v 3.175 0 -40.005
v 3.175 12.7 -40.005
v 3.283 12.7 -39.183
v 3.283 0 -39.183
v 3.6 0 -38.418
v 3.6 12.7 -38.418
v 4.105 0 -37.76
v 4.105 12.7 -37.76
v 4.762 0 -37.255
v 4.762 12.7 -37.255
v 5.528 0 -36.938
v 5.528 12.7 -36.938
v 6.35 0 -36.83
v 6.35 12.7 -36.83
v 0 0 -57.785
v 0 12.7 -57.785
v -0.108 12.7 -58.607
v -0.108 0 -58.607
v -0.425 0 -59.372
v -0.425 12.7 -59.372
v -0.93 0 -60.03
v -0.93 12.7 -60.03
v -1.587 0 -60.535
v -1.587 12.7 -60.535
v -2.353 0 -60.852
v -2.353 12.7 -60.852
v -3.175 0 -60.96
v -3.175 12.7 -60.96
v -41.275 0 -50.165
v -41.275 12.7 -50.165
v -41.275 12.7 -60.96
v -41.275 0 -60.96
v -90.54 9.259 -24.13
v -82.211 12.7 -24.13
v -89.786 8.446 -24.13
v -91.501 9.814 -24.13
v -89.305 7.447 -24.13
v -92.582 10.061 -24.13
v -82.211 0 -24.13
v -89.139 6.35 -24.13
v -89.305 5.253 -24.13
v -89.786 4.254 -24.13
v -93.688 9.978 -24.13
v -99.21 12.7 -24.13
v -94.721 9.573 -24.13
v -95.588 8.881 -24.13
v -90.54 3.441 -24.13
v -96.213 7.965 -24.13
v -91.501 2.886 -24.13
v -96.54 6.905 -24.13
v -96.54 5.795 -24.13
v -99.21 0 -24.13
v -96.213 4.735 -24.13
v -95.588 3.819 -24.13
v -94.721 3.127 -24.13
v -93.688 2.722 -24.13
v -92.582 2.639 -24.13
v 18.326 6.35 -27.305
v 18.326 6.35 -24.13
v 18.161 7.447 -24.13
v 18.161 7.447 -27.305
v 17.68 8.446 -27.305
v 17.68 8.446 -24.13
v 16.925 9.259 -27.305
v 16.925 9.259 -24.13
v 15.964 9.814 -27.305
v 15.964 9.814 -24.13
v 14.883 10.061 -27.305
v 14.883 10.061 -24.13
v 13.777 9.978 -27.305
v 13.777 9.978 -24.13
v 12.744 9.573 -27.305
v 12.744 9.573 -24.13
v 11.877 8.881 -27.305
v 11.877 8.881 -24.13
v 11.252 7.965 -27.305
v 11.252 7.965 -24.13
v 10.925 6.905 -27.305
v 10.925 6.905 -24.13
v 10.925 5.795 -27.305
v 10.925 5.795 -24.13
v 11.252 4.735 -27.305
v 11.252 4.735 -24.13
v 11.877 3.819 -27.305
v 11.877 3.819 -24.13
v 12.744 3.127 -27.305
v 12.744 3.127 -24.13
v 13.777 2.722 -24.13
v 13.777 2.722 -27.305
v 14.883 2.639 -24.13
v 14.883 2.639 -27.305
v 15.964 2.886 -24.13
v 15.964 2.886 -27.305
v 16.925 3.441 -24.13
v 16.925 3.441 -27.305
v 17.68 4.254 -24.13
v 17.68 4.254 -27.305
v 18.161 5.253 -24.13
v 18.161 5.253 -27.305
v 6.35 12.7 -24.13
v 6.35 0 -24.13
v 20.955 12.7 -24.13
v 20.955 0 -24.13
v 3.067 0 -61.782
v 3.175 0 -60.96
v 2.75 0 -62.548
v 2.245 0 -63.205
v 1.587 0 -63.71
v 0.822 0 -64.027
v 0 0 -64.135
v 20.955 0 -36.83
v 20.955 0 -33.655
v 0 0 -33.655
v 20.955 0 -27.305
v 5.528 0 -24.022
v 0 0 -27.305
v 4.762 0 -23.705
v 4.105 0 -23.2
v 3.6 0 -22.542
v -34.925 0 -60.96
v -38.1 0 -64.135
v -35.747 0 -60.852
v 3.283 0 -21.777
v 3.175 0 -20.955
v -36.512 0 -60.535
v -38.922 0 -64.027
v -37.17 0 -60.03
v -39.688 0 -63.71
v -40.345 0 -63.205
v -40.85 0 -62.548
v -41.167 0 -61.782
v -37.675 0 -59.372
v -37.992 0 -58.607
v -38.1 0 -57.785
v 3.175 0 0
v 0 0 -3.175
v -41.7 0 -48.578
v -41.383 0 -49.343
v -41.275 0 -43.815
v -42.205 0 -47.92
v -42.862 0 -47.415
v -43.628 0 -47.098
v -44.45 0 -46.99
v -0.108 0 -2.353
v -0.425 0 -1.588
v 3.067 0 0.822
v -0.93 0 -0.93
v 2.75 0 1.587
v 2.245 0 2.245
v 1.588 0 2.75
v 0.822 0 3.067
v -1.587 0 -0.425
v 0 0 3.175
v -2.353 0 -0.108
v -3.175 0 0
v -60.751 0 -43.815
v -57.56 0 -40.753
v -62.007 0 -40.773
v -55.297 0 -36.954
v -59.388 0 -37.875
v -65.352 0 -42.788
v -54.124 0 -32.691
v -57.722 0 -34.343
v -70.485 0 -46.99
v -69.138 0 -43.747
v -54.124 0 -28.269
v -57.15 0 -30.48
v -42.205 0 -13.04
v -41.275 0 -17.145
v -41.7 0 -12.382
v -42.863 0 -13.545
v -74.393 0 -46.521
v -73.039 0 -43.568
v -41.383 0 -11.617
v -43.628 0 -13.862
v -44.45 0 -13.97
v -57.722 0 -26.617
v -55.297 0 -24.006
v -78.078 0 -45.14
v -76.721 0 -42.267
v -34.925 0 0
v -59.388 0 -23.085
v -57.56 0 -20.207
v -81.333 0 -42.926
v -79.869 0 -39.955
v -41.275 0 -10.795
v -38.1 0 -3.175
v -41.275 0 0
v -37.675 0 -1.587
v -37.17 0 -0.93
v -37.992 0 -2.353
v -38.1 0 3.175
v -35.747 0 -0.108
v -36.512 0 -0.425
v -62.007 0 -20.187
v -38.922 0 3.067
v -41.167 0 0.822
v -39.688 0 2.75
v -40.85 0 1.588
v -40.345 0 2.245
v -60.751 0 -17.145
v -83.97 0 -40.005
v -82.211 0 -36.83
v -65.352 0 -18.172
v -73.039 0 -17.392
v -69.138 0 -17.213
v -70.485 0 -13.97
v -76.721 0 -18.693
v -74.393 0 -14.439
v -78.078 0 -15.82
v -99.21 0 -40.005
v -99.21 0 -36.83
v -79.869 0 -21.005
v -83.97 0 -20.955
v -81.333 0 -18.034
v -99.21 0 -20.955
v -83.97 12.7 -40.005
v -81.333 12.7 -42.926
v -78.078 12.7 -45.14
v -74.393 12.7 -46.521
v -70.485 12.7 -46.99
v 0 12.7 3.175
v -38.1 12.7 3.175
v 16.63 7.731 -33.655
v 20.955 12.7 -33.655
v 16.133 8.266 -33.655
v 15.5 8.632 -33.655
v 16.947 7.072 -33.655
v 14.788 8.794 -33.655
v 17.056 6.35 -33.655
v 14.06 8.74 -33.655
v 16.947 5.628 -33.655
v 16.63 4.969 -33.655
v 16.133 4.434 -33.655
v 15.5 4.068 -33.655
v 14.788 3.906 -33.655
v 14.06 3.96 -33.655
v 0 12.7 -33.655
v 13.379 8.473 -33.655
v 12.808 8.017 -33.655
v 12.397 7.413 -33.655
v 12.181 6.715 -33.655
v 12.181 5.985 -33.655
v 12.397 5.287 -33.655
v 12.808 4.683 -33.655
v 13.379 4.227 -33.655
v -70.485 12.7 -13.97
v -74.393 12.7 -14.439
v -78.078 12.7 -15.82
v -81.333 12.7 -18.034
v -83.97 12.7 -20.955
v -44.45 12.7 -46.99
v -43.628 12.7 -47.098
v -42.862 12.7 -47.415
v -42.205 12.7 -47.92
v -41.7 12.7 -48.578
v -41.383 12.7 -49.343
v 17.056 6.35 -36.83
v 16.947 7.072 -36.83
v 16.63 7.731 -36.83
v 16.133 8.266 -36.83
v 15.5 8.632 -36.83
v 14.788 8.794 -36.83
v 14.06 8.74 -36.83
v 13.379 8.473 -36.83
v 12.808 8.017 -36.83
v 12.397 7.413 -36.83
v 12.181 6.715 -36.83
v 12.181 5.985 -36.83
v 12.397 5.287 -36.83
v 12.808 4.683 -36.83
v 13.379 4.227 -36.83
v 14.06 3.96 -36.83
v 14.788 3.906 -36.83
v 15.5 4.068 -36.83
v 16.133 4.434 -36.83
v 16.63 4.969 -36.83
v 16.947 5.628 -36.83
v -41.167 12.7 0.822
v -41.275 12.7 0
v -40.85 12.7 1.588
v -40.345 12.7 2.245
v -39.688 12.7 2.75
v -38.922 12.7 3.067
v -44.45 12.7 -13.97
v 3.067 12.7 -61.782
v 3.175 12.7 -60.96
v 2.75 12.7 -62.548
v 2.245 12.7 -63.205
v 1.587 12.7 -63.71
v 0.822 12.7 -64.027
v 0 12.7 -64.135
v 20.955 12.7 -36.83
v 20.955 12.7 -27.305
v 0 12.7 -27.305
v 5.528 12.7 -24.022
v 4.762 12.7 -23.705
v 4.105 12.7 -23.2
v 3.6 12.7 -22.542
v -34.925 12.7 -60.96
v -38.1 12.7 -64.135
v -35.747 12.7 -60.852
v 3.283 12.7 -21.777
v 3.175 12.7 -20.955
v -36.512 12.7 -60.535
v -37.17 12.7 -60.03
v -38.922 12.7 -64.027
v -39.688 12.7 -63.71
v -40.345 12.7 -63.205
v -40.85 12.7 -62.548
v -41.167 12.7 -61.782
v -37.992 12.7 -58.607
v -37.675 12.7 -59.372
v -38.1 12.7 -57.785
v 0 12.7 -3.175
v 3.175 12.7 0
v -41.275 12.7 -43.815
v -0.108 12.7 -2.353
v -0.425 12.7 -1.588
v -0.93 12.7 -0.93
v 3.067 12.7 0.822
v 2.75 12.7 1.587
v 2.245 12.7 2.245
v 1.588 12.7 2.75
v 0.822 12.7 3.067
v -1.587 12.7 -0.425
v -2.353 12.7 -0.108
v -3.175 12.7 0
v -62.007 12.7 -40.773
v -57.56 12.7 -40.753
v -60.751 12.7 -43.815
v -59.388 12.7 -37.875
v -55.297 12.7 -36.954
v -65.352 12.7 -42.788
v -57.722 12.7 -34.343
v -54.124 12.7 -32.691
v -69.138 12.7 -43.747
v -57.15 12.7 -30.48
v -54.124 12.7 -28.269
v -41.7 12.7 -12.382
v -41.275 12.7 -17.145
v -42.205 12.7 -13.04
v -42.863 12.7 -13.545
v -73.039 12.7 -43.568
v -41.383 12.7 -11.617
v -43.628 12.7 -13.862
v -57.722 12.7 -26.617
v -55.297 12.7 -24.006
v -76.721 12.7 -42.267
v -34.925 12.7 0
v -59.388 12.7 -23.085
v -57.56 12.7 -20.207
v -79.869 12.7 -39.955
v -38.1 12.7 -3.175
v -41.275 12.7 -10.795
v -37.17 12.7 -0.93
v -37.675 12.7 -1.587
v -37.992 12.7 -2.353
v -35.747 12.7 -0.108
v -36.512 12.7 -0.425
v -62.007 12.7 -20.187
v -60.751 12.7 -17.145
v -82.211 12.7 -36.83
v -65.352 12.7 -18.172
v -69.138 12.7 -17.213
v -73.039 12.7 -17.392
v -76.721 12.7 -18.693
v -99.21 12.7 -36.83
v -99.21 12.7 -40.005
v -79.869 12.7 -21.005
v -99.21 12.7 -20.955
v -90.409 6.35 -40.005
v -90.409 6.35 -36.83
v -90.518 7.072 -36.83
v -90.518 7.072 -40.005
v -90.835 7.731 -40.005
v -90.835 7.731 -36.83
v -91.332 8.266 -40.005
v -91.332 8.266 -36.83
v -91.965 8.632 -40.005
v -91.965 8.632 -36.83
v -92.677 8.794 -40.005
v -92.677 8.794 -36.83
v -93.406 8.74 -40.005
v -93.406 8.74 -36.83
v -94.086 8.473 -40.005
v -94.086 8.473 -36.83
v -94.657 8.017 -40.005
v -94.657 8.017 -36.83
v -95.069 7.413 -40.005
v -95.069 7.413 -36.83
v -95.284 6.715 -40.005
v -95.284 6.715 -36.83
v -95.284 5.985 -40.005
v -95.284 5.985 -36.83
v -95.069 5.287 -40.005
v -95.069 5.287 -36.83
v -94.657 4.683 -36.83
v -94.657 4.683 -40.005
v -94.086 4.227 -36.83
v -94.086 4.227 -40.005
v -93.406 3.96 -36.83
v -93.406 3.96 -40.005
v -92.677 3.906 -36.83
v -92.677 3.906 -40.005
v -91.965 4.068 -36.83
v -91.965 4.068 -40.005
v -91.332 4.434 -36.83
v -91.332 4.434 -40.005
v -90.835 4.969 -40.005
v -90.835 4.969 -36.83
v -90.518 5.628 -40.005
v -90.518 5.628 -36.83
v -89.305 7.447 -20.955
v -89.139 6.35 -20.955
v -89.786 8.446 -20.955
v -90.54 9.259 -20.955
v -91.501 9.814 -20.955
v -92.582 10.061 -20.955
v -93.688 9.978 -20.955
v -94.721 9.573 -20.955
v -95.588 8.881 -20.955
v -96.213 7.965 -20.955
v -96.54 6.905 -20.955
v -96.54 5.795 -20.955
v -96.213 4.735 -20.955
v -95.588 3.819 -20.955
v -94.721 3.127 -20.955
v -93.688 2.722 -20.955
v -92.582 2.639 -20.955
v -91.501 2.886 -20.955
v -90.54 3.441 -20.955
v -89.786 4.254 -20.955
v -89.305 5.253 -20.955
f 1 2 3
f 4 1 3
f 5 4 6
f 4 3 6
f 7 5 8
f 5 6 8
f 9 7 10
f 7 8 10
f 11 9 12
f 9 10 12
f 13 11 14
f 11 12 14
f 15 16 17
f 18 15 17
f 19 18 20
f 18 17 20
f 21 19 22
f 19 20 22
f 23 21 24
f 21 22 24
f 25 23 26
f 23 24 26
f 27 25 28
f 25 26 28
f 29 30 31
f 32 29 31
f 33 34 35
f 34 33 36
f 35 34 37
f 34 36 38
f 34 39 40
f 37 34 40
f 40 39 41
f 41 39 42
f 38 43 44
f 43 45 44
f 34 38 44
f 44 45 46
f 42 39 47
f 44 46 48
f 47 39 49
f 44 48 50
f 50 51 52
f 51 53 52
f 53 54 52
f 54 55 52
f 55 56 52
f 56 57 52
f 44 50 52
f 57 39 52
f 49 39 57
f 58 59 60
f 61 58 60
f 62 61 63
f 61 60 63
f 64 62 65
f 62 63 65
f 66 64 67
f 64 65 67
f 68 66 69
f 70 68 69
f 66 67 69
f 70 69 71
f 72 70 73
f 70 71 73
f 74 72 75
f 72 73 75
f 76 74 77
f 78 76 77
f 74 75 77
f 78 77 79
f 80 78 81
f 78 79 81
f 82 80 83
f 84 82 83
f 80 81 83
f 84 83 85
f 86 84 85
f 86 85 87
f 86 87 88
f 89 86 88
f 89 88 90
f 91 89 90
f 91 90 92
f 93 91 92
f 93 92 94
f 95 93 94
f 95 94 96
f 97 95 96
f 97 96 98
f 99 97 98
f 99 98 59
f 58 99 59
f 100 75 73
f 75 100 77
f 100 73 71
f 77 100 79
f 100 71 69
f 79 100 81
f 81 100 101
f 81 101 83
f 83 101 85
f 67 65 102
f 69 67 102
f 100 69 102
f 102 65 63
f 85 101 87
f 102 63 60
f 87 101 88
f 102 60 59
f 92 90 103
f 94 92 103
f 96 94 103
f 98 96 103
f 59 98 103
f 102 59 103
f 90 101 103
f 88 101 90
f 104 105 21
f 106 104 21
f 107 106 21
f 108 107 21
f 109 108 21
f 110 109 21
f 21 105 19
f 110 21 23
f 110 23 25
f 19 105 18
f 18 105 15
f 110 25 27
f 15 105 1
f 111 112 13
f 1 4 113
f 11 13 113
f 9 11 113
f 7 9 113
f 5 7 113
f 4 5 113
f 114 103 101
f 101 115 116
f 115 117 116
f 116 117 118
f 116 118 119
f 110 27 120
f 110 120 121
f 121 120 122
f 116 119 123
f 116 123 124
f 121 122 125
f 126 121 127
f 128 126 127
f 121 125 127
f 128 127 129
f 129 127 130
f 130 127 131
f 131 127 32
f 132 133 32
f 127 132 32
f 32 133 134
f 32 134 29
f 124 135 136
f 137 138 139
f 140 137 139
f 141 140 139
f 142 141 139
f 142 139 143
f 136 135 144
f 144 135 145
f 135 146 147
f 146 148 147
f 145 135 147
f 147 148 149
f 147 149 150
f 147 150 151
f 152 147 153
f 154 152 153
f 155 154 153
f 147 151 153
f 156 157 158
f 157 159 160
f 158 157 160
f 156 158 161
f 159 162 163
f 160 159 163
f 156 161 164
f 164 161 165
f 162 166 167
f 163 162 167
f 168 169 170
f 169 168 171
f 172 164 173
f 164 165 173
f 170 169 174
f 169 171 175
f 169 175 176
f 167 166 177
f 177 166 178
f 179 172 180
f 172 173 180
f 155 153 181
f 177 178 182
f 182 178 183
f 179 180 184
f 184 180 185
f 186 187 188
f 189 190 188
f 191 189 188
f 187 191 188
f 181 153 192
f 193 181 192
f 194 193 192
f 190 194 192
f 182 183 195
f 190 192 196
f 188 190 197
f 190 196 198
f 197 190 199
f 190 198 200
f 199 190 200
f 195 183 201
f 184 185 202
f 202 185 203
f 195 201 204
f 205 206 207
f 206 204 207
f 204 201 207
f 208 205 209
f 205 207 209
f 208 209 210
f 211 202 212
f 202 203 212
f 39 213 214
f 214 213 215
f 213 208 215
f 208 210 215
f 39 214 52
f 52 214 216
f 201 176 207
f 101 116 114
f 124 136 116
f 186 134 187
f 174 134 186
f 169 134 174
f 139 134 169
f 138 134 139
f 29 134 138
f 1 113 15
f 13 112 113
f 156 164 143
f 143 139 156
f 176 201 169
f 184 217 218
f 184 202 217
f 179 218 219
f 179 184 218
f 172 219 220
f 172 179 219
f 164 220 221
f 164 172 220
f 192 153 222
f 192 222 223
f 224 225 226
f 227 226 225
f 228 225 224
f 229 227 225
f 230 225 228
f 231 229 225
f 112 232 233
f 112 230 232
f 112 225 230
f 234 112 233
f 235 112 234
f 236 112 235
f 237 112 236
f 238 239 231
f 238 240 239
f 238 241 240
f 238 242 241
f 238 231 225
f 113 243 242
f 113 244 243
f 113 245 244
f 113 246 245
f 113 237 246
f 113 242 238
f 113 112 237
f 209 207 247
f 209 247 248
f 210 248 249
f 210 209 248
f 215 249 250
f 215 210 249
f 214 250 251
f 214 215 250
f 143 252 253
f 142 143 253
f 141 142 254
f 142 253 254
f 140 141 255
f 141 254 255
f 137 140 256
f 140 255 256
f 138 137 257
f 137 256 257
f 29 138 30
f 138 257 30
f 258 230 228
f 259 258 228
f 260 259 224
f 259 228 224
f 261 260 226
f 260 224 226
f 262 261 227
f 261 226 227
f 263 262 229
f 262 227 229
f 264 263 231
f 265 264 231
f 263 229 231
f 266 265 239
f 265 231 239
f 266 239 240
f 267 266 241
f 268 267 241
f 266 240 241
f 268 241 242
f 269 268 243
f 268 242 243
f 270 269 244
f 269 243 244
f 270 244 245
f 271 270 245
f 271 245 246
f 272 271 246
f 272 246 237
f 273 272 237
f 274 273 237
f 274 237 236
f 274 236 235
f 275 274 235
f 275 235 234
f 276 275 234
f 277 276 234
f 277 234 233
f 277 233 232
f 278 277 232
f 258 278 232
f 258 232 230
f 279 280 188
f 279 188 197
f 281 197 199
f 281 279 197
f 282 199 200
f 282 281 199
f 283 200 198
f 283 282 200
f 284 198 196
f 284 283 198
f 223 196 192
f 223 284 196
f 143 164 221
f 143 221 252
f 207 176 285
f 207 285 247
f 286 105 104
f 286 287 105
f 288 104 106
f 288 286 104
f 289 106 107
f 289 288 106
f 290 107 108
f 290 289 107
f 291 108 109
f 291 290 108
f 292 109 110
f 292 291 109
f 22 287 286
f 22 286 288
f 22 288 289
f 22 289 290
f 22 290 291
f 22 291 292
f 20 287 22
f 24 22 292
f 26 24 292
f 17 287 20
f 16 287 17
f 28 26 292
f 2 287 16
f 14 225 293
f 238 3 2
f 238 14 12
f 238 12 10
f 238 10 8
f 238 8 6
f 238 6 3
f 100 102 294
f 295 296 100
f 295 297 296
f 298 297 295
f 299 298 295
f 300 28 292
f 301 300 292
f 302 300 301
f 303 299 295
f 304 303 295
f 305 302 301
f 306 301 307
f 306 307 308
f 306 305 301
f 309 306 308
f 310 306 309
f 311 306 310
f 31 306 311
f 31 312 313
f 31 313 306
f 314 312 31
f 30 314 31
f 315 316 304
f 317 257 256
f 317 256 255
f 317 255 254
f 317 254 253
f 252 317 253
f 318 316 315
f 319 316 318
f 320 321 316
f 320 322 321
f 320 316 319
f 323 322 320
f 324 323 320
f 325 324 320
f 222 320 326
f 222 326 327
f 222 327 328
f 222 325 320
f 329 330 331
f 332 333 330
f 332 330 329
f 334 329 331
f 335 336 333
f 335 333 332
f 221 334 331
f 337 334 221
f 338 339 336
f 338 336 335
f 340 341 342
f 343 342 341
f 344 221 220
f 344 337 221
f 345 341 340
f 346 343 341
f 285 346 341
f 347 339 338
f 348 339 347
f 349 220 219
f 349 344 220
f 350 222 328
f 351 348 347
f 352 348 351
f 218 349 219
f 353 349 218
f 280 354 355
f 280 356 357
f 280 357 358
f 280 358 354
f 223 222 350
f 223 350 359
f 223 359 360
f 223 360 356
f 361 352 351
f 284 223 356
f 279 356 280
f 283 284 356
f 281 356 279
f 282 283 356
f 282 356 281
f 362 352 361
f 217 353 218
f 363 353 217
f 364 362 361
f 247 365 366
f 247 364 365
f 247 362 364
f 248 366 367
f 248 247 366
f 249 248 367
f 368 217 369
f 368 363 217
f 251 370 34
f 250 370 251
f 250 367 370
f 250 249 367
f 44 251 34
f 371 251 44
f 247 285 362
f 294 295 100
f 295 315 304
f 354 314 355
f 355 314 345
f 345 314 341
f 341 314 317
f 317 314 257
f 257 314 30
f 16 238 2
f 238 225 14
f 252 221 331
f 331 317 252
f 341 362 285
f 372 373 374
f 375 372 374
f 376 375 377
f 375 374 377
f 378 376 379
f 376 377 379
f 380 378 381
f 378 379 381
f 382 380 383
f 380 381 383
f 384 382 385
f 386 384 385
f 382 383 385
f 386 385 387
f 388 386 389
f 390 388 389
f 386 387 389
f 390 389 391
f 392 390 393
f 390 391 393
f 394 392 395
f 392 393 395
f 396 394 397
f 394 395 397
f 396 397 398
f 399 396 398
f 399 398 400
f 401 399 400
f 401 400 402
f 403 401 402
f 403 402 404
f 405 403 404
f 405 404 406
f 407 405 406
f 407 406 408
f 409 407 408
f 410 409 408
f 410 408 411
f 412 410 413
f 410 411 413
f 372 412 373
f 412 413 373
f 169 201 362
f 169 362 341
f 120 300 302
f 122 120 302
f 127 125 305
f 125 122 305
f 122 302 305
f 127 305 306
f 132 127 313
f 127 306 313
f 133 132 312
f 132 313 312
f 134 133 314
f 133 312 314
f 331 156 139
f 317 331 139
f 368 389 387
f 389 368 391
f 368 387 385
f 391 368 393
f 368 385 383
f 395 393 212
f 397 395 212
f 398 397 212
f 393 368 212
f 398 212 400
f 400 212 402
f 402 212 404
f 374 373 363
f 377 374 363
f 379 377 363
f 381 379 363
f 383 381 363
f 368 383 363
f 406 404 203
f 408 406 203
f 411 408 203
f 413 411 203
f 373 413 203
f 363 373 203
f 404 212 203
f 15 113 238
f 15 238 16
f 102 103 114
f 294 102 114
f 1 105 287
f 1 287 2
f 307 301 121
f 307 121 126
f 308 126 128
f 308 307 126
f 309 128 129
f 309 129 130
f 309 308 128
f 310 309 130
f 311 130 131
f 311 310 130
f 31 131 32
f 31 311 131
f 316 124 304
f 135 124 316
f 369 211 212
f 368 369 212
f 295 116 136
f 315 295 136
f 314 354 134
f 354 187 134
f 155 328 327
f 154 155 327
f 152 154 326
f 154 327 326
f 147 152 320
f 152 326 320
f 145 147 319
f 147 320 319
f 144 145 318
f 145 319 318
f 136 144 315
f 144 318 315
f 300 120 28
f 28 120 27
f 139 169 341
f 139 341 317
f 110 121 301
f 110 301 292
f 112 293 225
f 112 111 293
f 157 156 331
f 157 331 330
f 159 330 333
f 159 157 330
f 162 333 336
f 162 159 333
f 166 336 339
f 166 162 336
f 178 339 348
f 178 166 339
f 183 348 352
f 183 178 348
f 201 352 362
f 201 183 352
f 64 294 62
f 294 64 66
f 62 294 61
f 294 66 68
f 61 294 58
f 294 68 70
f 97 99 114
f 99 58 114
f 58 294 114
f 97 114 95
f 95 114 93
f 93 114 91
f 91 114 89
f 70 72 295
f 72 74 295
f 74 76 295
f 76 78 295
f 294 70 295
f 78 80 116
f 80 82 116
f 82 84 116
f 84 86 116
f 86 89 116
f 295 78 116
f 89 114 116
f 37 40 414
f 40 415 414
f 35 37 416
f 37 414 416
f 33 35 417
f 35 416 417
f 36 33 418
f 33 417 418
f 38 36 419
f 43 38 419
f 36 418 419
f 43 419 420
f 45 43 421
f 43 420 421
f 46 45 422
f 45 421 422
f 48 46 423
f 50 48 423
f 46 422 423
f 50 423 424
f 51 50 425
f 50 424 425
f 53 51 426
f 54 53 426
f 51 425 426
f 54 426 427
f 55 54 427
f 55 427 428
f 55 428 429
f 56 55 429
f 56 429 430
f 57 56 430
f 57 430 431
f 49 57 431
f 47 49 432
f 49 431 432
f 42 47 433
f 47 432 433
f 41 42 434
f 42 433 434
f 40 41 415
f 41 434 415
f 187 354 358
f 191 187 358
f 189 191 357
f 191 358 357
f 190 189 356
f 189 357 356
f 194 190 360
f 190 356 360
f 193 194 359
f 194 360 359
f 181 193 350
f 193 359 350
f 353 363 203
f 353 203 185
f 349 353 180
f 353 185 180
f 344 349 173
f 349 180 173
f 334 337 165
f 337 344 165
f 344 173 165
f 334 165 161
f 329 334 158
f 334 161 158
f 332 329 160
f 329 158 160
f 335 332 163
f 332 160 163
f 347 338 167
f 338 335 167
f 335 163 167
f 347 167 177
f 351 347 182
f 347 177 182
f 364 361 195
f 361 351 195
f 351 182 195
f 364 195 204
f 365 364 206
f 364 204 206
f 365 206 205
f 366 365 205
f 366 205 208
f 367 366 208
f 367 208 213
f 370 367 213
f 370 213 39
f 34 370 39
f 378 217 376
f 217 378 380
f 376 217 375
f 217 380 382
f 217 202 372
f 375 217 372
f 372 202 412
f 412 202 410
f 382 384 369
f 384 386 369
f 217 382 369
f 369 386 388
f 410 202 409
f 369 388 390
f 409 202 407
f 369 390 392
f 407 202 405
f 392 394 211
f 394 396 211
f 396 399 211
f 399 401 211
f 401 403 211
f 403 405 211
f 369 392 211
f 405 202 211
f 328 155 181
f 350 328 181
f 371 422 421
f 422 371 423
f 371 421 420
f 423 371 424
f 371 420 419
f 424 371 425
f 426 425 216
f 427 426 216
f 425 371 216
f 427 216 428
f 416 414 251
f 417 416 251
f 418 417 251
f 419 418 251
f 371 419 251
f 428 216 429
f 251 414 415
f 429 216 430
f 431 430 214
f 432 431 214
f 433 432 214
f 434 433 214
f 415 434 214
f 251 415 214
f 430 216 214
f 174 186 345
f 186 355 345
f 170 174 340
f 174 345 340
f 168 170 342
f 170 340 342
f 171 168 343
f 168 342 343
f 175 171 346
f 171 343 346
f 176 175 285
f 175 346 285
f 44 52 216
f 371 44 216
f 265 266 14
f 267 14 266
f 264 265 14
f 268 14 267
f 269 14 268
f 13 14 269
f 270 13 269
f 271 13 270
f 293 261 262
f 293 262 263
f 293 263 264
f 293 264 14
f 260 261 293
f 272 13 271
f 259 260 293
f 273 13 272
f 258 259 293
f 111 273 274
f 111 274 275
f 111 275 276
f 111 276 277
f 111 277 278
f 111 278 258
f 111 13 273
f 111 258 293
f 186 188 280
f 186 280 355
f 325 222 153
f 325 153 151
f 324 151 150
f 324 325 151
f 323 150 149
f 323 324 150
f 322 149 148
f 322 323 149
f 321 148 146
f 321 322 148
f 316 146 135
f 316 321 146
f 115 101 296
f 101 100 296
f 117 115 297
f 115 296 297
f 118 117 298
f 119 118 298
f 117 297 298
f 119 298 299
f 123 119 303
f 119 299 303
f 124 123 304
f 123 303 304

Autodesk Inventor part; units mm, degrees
ref_plane "YZ Plane" through (0, 0, 0) normal (1, 0, 0) x (0, 1, 0)
ref_plane "XZ Plane" through (0, 0, 0) normal (0, 1, 0) x (-1, 0, 0)
ref_plane "XY Plane" through (0, 0, 0) normal (0, 0, 1) x (1, 0, 0)
sketch "Sketch1" plane through (0, 0, 0) normal (0, 1, 0) x (-1, 0, 0)
  line L0 (0, 0) -> (38.1, 0)
  line L1 (38.1, 0) -> (38.1, -60.96)
  line L2 (38.1, -60.96) -> (0, -60.96)
  line L3 (-3.175, 3.175) -> (41.275, 3.175)
  line L4 (41.275, 3.175) -> (41.275, -64.135)
  line L5 (41.275, -64.135) -> (-3.175, -64.135)
  line L6 (-3.175, -36.83) -> (-20.955, -36.83)
  line L7 (-20.955, -36.83) -> (-20.955, -33.655)
  line L8 (-20.955, -33.655) -> (0, -33.655)
  line L9 (0, -33.655) -> (0, -44.417)
  line L10 (-3.175, -24.13) -> (-20.955, -24.13)
  line L11 (-20.955, -24.13) -> (-20.955, -27.305)
  line L12 (-20.955, -27.305) -> (0, -27.305)
  line L13 (0, -27.305) -> (0, -17.217)
  line L14 (0, -60.96) -> (0, -33.655)
  line L15 (0, -27.305) -> (0, 0)
  line L16 (-3.175, -24.13) -> (-3.175, 3.175)
  line L17 (-3.175, -64.135) -> (-3.175, -36.83)
  arc A0 (82.211, -24.13) -> (82.211, -36.83) centre (70.485, -30.48) ccw
  line L18 (99.2103, -36.83) -> (82.211, -36.83)
  line L19 (99.2103, -40.005) -> (99.2103, -36.83)
  line L20 (82.211, -24.13) -> (99.2103, -24.13)
  line L21 (99.2103, -24.13) -> (99.2103, -20.955)
  line L22 (99.2103, -20.955) -> (83.9703, -20.955)
  line L23 (83.9703, -40.005) -> (99.2103, -40.005)
  arc A1 (83.9703, -20.955) -> (83.9703, -40.005) centre (70.485, -30.48) ccw
  line L24 (41.275, -13.97) -> (70.485, -13.97)
  line L25 (70.485, -46.99) -> (41.275, -46.99)
  line L26 (60.7506, -17.145) -> (41.275, -17.145)
  line L27 (60.7506, -43.815) -> (41.275, -43.815)
  point P0 (41.275, -30.48)
  dimension "d0" = 38.1
  dimension "d1" = 60.96
  dimension "d2" = 3.175
  dimension "d3" = 3.175
  dimension "d4" = 3.175
  dimension "d5" = 3.175
  dimension "d6" = 3.175
  dimension "d7" = 3.175
  dimension "d8" = 3.175
  dimension "d9" = 17.78
  dimension "d10" = 6.35
  dimension "d23" = 26.67
  dimension "d25" = 3.175
  dimension "d27" = 15.24
  dimension "d28" = 6.35
  dimension "d29" = 6.35
  dimension "d30" = 3.175
  dimension "d31" = 3.175
  dimension "d32" = 12.7
  dimension "d33" = 3.175
  dimension "d34" = 3.175
extrude "Extrusion1" add sketch "Sketch1" along normal blind 12.7 contours L15 L13 L12 L11 L10 L16 L3 L4 L5 L17 L6 L7 L8 L9 L14 L2 L1 L0 | L24 A1 L26 L4 | A1 L22 L21 L20 A0 L18 L19 L23 | L27 A1 L25 L4
sketch "Sketch2" plane through (3.175, 0, -24.13) normal (0, 0, 1) x (1, 0, 0)
  circle A0 centre (11.43, 6.35) radius 2.4511
  line L0 (0, 12.7) -> (17.78, 12.7) projected
  line L1 (17.78, 0) -> (17.78, 12.7) projected
  point P0 (-3.175, 0)
  dimension "d13" = 4.9022
  dimension "d14" = 6.35
  dimension "d15" = 6.35
extrude "Extrusion2" cut sketch "Sketch2" against normal blind 23.8125
sketch "Sketch3" plane through (3.175, 0, -24.13) normal (0, 0, 1) x (1, 0, 0)
  circle A0 centre (11.43, 6.35) radius 2.4511 projected
  circle A1 centre (11.43, 6.35) radius 3.7211
  point P0 (-3.175, 0)
  dimension "d18" = 1.27
extrude "Extrusion3" cut sketch "Sketch3" against normal blind 9.525
fillet "Fillet1" radius 3.175 4 edges at (-38.1, 6.35, -60.96) (0, 6.35, -60.96) (0, 6.35, 0) (-38.1, 6.35, 0)
fillet "Fillet2" radius 3.175 8 edges at (-41.275, 6.35, 3.175) (-41.275, 6.35, -64.135) (3.175, 6.35, -64.135) (3.175, 6.35, 3.175) (3.175, 6.35, -24.13) (3.175, 6.35, -36.83) (-41.275, 6.35, -13.97) (-41.275, 6.35, -46.99)
sketch "Sketch4" plane through (-99.2103, 0, -20.955) normal (0, 0, 1) x (1, 0, 0)
  circle A0 centre (6.35, 6.35) radius 2.4511
  line L0 (0, 12.7) -> (15.24, 12.7) projected
  line L1 (0, 0) -> (0, 12.7) projected
  point P0 (99.2103, 0)
  dimension "d35" = 4.9022
  dimension "d36" = 6.35
  dimension "d37" = 6.35
extrude "Extrusion4" cut sketch "Sketch4" against normal blind 23.8125
sketch "Sketch5" plane through (-99.2103, 0, -20.955) normal (0, 0, 1) x (1, 0, 0)
  circle A0 centre (6.35, 6.35) radius 2.4511 projected
  circle A1 centre (6.35, 6.35) radius 3.7211
  point P0 (99.2103, 0)
  dimension "d40" = 1.27
extrude "Extrusion5" cut sketch "Sketch5" against normal blind 9.525
equation "\"d3\" = d2"
equation "\"d4\" = d2"
equation "\"d5\" = d2"
equation "\"d6\" = d2"
equation "\"d7\" = d2"
equation "\"d8\" = d2"
equation "\"d25\" = d2"
equation "\"d29\" = d28"
equation "\"d30\" = d2"
equation "\"d31\" = d2"
equation "\"d33\" = d2"
equation "\"d34\" = d2"
equation "\"d15\" = d14"
equation "\"d37\" = d36"
equation "\"d24\" = d2"
equation "\"d26\" = d2"
properties part number "kinect mount" material "PC/ABS Plastic"
